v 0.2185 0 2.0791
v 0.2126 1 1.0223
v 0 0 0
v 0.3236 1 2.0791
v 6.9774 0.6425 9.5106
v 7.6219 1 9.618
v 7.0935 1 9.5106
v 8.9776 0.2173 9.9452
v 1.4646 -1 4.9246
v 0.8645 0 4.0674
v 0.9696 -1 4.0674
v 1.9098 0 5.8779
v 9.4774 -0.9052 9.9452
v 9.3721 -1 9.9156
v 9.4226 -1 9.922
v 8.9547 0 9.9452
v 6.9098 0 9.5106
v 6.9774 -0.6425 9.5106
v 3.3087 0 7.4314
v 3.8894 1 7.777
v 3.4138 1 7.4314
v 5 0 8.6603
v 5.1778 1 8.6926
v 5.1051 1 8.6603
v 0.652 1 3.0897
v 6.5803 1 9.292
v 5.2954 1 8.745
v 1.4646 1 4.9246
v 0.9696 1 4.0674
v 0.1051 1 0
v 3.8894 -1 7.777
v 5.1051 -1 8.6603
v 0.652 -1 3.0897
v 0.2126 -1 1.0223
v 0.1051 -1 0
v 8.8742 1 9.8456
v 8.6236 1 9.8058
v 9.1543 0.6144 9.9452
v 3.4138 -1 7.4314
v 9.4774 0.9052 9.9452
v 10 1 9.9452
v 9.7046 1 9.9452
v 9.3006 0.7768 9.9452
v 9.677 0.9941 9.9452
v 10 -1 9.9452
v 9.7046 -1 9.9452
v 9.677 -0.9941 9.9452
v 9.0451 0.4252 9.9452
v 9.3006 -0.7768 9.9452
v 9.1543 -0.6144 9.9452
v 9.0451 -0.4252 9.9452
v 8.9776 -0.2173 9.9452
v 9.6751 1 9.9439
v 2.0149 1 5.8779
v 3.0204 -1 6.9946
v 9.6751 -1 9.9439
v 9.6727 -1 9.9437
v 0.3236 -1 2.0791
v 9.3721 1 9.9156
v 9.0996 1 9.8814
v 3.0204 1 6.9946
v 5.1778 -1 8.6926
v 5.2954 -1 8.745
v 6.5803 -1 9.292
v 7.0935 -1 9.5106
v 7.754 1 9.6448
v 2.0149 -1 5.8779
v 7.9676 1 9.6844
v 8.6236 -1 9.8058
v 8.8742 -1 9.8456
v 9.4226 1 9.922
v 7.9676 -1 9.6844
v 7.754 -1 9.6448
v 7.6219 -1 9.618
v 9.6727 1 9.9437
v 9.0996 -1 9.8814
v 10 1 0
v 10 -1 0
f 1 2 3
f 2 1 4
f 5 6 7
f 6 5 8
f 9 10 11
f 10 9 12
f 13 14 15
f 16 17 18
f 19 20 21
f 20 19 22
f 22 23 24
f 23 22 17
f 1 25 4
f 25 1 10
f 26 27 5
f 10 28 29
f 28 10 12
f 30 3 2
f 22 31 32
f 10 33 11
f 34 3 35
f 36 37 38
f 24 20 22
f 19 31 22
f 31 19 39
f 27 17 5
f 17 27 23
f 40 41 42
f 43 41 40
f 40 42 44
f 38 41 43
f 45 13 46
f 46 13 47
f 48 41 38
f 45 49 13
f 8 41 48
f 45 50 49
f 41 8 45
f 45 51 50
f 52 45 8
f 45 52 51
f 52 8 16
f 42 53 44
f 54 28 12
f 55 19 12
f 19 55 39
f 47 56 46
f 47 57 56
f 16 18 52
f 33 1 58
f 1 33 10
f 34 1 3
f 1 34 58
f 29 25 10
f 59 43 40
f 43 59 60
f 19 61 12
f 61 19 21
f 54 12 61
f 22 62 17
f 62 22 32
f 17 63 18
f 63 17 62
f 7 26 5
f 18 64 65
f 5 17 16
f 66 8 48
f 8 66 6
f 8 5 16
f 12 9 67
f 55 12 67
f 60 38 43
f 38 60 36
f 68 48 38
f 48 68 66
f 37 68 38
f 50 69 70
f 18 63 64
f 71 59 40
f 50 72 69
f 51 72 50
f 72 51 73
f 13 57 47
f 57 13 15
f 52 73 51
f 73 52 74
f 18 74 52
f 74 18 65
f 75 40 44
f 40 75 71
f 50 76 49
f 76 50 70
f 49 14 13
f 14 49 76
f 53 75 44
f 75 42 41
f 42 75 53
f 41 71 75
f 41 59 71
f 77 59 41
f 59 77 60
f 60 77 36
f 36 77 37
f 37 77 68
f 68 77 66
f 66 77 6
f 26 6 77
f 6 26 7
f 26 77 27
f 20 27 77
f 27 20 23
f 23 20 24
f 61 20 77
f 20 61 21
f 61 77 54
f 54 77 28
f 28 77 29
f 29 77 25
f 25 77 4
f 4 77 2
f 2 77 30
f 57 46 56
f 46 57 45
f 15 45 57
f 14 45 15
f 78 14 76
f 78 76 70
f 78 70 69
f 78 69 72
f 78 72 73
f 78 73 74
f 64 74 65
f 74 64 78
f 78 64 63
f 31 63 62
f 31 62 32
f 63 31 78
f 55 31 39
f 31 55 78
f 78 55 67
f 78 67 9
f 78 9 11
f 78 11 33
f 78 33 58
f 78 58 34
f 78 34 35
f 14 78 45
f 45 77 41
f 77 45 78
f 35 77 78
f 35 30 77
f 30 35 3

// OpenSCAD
module rim() { 
    difference() { 
        translate([10, 0, 0]) sphere(10); 

        translate([-1,1,-11]) cube([22,10,22]); 
        translate([-1,-11,-11]) cube([22,10,22]); 
        
        translate([10, -2, -11]) cube([11,5,22]); 
        translate([-1, -2, -11]) cube([22, 5, 11]); 
    }
}

rim();
